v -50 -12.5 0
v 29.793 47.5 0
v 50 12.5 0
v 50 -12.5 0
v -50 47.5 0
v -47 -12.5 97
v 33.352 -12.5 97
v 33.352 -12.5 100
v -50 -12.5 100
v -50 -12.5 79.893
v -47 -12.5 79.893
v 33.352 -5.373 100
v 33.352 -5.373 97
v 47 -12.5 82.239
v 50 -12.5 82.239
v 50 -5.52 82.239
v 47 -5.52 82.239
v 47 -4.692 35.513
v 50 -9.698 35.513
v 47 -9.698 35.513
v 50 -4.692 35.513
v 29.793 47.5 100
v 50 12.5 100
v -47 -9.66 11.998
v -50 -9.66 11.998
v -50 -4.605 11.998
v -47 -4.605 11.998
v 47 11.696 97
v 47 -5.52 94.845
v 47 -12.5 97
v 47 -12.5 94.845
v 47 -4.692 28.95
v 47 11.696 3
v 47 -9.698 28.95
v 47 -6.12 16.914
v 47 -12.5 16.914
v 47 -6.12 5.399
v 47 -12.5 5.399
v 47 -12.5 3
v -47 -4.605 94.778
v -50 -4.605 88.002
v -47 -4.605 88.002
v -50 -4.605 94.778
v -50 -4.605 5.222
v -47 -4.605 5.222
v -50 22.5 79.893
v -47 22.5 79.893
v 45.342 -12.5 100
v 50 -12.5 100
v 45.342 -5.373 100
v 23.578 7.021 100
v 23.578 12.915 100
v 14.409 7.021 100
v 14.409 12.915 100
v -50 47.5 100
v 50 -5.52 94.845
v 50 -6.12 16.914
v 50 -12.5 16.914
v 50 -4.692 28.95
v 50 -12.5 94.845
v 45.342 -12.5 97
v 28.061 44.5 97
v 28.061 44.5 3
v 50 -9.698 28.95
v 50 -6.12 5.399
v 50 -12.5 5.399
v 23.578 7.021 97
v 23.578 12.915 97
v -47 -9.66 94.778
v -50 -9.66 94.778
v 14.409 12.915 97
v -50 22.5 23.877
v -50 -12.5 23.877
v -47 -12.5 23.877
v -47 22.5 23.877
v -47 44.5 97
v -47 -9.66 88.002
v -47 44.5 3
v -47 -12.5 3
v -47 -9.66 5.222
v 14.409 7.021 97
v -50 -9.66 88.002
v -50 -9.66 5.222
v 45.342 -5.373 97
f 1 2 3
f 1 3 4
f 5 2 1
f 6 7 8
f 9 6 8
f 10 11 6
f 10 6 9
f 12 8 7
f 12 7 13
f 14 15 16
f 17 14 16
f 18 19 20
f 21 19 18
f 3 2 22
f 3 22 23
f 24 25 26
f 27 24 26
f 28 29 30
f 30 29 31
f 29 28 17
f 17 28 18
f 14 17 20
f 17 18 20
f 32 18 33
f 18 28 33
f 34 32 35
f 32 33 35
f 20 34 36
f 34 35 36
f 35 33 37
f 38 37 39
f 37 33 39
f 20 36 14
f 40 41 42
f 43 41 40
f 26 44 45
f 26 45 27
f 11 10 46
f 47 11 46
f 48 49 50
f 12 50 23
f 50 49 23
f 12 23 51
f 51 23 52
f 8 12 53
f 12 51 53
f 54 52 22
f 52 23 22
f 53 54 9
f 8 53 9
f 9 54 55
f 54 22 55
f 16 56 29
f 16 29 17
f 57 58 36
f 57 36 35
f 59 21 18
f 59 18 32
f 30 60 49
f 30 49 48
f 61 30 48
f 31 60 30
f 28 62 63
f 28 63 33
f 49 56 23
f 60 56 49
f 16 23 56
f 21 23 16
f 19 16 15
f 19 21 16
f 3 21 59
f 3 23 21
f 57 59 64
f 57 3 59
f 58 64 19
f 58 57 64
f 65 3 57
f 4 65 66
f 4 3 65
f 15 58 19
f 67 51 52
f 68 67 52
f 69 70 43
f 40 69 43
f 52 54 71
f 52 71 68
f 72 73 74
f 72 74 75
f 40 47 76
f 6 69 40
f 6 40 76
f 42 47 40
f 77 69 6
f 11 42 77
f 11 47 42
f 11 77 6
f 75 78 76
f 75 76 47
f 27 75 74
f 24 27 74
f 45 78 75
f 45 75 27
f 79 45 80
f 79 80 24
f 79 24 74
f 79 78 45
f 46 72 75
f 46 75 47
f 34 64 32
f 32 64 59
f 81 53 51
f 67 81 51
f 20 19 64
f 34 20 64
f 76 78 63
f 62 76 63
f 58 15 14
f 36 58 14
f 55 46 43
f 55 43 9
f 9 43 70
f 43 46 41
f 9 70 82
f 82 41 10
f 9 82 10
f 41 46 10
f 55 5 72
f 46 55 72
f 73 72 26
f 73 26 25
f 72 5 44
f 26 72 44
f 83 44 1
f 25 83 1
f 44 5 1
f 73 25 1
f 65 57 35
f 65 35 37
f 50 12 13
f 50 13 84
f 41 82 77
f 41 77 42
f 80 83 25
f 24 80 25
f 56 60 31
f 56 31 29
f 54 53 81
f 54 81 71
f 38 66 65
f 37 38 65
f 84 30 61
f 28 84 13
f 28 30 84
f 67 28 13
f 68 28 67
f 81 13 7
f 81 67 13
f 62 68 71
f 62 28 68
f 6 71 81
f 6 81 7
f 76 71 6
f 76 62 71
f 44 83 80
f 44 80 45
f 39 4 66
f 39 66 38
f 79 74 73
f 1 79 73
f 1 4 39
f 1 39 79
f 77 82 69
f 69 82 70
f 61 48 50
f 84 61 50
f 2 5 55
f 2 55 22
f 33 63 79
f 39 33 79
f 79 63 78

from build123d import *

# Parameters (mm, degrees)
BOSS_EXTRUDE1_DEPTH = 100
SHELL1_T            = -3
SKETCH2_W           = 56.015644735
SKETCH2_H           = 35
CUT_EXTRUDE1_DEPTH  = 10
SKETCH3_W           = 12.606592538
SKETCH3_H           = 6.980178381
SKETCH3_W_2         = 11.515112664
SKETCH3_H_2         = 6.37986445
CUT_EXTRUDE2_DEPTH  = 10
SKETCH4_W           = 9.169229256
SKETCH4_H           = 5.894504522
CUT_EXTRUDE3_DEPTH  = 10
SKETCH5_W           = 6.776014824
SKETCH5_H           = 5.054240566
CUT_EXTRUDE4_DEPTH  = 10
SKETCH6_W           = 11.990530565
SKETCH6_H           = 7.12730724
CUT_EXTRUDE5_DEPTH  = 10
SKETCH8_W           = 6.563036955
SKETCH8_H           = 5.005706152
CUT_EXTRUDE6_DEPTH  = 10


with BuildPart() as part:
    # Sketch1 → Boss-Extrude1 (new body)
    with BuildSketch(Plane.XY):
        Polygon((-50, 12.5), (-50, 47.5), (29.792740578, 47.5), (50, 12.5), (50, -12.5), (-50, -12.5), align=None)
    extrude(amount=BOSS_EXTRUDE1_DEPTH)

    # Shell1
    shell1_openings = [part.faces().sort_by_distance(p)[0] for p in [
        (0, -12.5, 50),
    ]]
    offset(amount=SHELL1_T, openings=shell1_openings, kind=Kind.INTERSECTION)

    # Sketch2 → Cut-Extrude1 (cut)
    with BuildSketch(Plane.ZY.offset(50)):
        with Locations((51.884685058, 5)):
            Rectangle(SKETCH2_W, SKETCH2_H)
    extrude(amount=-CUT_EXTRUDE1_DEPTH, mode=Mode.SUBTRACT)

    # Sketch3 → Cut-Extrude2 (cut)
    with BuildSketch(Plane(origin=(50, 0, 0), x_dir=(0, 0, -1), z_dir=(1, 0, 0))):
        with Locations((-88.542199405, -9.009910809)):
            Rectangle(SKETCH3_W, SKETCH3_H)
        with Locations((-11.156276384, -9.310067775)):
            Rectangle(SKETCH3_W_2, SKETCH3_H_2)
    extrude(amount=-CUT_EXTRUDE2_DEPTH, mode=Mode.SUBTRACT)

    # Sketch4 → Cut-Extrude3 (cut)
    with BuildSketch(Plane.XY.offset(100)):
        with Locations((18.993403459, 9.968133111)):
            Rectangle(SKETCH4_W, SKETCH4_H)
    extrude(amount=-CUT_EXTRUDE3_DEPTH, mode=Mode.SUBTRACT)

    # Sketch5 → Cut-Extrude4 (cut)
    with BuildSketch(Plane.ZY.offset(50)):
        with Locations((8.609898129, -7.132480119)):
            Rectangle(SKETCH5_W, SKETCH5_H)
        with Locations((91.390101871, -7.132480119)):
            Rectangle(SKETCH5_W, SKETCH5_H)
    extrude(amount=-CUT_EXTRUDE4_DEPTH, mode=Mode.SUBTRACT)

    # Sketch6 → Cut-Extrude5 (cut)
    with BuildSketch(Plane.XY.offset(100)):
        with Locations((39.347077193, -8.93634638)):
            Rectangle(SKETCH6_W, SKETCH6_H)
    extrude(amount=-CUT_EXTRUDE5_DEPTH, mode=Mode.SUBTRACT)

    # Sketch8 → Cut-Extrude6 (cut)
    with BuildSketch(Plane(origin=(50, 0, 0), x_dir=(0, 0, -1), z_dir=(1, 0, 0))):
        with Locations((-32.231091097, -7.194817018)):
            Rectangle(SKETCH8_W, SKETCH8_H)
    extrude(amount=-CUT_EXTRUDE6_DEPTH, mode=Mode.SUBTRACT)


solid = part.part
